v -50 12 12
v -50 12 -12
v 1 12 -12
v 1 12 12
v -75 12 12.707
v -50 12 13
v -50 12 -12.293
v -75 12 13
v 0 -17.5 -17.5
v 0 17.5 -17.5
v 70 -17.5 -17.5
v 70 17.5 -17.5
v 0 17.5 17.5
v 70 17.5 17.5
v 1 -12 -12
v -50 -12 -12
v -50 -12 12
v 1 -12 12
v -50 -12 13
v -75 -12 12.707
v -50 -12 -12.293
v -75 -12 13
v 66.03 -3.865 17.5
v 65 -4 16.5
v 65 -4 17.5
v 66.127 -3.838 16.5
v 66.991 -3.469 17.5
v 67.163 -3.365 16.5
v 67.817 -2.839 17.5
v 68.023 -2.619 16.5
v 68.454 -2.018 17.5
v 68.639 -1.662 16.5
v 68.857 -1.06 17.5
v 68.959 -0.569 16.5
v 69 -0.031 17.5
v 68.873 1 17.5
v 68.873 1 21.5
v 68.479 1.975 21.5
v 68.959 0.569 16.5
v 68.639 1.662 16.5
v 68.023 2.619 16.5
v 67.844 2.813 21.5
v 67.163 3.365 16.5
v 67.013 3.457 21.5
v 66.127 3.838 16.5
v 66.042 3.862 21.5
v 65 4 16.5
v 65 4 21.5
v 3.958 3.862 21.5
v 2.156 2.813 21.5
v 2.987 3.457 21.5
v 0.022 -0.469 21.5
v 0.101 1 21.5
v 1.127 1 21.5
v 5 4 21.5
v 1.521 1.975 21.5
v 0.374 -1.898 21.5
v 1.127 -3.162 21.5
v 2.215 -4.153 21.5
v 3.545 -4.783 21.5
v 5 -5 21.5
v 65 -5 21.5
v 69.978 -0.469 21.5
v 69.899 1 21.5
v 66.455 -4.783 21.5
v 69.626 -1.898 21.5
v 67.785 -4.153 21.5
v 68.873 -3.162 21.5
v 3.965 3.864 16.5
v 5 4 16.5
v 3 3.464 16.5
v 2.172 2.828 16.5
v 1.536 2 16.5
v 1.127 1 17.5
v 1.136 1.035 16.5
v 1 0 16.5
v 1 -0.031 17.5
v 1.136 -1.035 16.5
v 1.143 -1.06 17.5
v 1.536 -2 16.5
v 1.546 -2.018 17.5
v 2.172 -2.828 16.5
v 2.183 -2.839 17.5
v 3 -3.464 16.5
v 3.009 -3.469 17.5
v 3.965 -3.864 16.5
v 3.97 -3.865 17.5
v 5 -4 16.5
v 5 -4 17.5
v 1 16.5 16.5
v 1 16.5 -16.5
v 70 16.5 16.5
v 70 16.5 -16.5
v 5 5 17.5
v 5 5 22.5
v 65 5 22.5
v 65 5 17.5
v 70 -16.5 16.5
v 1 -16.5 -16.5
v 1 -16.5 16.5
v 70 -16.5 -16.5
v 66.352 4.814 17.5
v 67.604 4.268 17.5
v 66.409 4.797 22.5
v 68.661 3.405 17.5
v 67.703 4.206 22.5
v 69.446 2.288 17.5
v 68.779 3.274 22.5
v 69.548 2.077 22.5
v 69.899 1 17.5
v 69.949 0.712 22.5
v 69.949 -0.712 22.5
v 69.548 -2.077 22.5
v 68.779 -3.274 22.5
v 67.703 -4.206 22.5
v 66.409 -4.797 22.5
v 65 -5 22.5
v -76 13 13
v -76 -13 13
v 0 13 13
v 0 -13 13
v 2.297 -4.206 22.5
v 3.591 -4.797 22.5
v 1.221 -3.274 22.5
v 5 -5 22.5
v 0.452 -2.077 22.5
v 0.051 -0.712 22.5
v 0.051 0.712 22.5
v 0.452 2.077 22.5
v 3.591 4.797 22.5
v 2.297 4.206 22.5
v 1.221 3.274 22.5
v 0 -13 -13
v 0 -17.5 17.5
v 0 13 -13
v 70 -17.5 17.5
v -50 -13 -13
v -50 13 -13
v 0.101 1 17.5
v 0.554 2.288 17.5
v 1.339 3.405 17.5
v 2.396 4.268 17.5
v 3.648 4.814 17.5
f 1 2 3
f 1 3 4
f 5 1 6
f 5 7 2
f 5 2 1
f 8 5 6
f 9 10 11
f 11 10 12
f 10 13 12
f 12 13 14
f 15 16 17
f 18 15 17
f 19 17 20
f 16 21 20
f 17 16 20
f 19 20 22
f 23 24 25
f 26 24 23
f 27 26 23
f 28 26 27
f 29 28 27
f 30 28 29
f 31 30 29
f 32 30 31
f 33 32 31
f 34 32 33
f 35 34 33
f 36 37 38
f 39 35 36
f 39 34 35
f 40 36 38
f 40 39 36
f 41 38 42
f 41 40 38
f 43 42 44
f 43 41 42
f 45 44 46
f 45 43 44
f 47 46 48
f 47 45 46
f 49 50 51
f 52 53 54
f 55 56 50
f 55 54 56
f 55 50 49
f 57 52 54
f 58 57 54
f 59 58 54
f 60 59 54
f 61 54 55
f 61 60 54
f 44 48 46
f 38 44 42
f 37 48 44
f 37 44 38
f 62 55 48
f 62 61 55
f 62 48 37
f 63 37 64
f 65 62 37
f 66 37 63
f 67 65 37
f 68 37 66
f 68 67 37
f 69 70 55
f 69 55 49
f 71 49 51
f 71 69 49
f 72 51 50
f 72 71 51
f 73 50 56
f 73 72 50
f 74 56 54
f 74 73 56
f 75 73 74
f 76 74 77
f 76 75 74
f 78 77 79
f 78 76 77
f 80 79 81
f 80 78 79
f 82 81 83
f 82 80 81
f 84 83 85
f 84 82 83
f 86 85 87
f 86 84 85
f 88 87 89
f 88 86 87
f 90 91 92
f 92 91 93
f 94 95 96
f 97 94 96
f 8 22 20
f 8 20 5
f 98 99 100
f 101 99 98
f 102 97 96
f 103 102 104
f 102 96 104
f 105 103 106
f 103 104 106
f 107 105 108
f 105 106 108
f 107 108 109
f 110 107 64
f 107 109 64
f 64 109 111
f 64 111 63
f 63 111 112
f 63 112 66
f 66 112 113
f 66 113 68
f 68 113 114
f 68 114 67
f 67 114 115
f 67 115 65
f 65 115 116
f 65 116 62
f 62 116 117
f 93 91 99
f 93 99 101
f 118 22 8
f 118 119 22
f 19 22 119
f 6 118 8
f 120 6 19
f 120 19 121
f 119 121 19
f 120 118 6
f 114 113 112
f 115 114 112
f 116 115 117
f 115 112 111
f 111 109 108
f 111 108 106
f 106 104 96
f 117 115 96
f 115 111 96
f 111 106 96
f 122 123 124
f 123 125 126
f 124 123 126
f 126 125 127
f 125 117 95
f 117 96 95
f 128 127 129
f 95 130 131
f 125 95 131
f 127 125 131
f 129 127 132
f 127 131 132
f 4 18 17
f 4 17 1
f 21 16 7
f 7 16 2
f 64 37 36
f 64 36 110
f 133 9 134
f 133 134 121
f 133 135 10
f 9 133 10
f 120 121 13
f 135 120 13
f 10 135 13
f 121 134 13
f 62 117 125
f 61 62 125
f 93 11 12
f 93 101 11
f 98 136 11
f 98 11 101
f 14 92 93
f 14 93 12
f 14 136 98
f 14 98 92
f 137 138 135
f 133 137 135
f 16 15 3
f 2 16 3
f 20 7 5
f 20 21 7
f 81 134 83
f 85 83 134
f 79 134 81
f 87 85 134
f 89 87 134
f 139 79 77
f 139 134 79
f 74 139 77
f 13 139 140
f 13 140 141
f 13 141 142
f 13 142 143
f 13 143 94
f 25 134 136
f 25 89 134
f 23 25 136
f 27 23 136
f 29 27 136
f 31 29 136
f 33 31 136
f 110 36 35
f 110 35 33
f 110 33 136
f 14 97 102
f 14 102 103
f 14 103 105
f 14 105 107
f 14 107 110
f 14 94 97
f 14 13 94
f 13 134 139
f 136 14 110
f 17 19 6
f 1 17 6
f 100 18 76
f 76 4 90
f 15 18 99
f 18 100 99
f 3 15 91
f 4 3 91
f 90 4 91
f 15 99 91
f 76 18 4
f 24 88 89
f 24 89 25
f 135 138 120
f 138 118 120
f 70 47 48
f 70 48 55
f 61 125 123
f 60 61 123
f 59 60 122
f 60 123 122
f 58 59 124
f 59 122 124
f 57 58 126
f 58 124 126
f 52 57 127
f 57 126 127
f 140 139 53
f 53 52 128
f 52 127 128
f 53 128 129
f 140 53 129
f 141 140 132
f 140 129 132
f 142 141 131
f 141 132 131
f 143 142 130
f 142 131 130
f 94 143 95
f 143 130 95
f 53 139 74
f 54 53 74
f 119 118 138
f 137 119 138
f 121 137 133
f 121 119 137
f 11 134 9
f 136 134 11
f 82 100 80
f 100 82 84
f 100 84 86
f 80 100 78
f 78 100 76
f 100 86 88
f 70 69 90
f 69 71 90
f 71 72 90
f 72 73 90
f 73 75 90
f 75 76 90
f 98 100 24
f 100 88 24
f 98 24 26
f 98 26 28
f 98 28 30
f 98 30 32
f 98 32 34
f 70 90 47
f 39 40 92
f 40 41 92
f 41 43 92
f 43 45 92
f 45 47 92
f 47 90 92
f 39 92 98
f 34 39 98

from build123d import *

# Parameters (mm, degrees)
SKETCH_4_W           = 70
SKETCH_4_H           = 35
EXTRUDE_6_DEPTH      = 17.5
EXTRUDE_7_DEPTH      = 5
SHELL_START          = -16.5
SHELL_3_OUTLINE_W    = 69
SHELL_3_OUTLINE_H    = 33
SHELL_3_DEPTH        = 33
SHELL_START_2        = 16.5
SHELL_3_2_DEPTH      = 5
SKETCH_9_W           = 70
SKETCH_9_H           = 4
CUT_EXTRUDE_1_DEPTH  = 6
SKETCH_22_W          = 50
SKETCH_22_H          = 26
EXTRUDE_8_DEPTH      = 13
SHELL_START_3        = -50
SHELL_4_OUTLINE_W    = 24
SHELL_4_OUTLINE_H    = 24
SHELL_4_DEPTH        = 50
SKETCH_23_W          = 24
SKETCH_23_H          = 24
CUT_EXTRUDE_3_DEPTH  = 1
EXTRUDE_11_DEPTH     = 13
SHELL_START_4        = -12
SHELL_13_DEPTH       = 24
CUT_EXTRUDE_16_REACH = 85.741
SKETCH_40_W          = 25
SKETCH_40_H          = 24


# Read off the part's stored shape, not the designer's step: 抽壳3, 抽壳4, 抽壳13
with BuildPart() as part:
    # 草图4 → 凸台-拉伸6 (new, symmetric)
    with BuildSketch(Plane.XY):
        with Locations((35, 0)):
            Rectangle(SKETCH_4_W, SKETCH_4_H)
    extrude(amount=EXTRUDE_6_DEPTH, both=True)

    # 草图6 → 凸台-拉伸7 (add)
    with BuildSketch(Plane.XY.offset(22.5)):
        with BuildLine():
            Line((5, 5), (65, 5))
            ThreePointArc((65, 5), (70, 0), (65, -5))
            Line((65, -5), (5, -5))
            ThreePointArc((5, -5), (0, 0), (5, 5))
        make_face()
    extrude(amount=-EXTRUDE_7_DEPTH)

    # 抽壳3 outline → 抽壳3 (cut)
    with BuildSketch(Plane.XY.offset(SHELL_START)):
        with Locations((35.5, 0)):
            Rectangle(SHELL_3_OUTLINE_W, SHELL_3_OUTLINE_H)
    extrude(amount=SHELL_3_DEPTH, mode=Mode.SUBTRACT)

    # Shell 3 2 outline → Shell 3 2 (cut)
    with BuildSketch(Plane.XY.offset(SHELL_START_2)):
        with BuildLine():
            ThreePointArc((5, 4), (1, 0), (5, -4))
            Line((5, -4), (65, -4))
            ThreePointArc((65, -4), (69, 0), (65, 4))
            Line((65, 4), (5, 4))
        make_face()
    extrude(amount=SHELL_3_2_DEPTH, mode=Mode.SUBTRACT)

    # 草图9 → 切除-拉伸1 (cut)
    with BuildSketch(Plane.XZ.offset(5)):
        with Locations((35, 19.5)):
            Rectangle(SKETCH_9_W, SKETCH_9_H)
    extrude(amount=-CUT_EXTRUDE_1_DEPTH, mode=Mode.SUBTRACT)

    # 草图22 → 凸台-拉伸8 (add, symmetric)
    with BuildSketch(Plane.XY):
        with Locations((-25, 0)):
            Rectangle(SKETCH_22_W, SKETCH_22_H)
    extrude(amount=EXTRUDE_8_DEPTH, both=True)

    # 抽壳4 outline → 抽壳4 (cut)
    with BuildSketch(Plane.YZ.offset(SHELL_START_3)):
        Rectangle(SHELL_4_OUTLINE_W, SHELL_4_OUTLINE_H)
    extrude(amount=SHELL_4_DEPTH, mode=Mode.SUBTRACT)

    # 草图23 → 切除-拉伸3 (cut)
    with BuildSketch(Plane.ZY):
        Rectangle(SKETCH_23_W, SKETCH_23_H)
    extrude(amount=-CUT_EXTRUDE_3_DEPTH, mode=Mode.SUBTRACT)

    # 草图28 → 凸台-拉伸11 (add, symmetric)
    with BuildSketch(Plane(origin=(0, 0, 0), x_dir=(1, 0, 0), z_dir=(0, 1, 0))):
        Polygon((-50, 13), (-50, -13), (-76, -13), align=None)
    extrude(amount=EXTRUDE_11_DEPTH, both=True)

    # 抽壳13 outline → 抽壳13 (cut)
    with BuildSketch(Plane(origin=(0, 0, 0), x_dir=(1, 0, 0), z_dir=(0, 1, 0)).offset(SHELL_START_4)):
        Polygon((-50, 11.585786438), (-73.585786438, -12), (-50, -12), align=None)
    extrude(amount=SHELL_13_DEPTH, mode=Mode.SUBTRACT)

    # 切除-拉伸16: up to this plane
    cut_extrude_16_end = Plane(origin=(-75.646446609, 13, 13.353553391), z_dir=(0.7071067811865512, 0, 0.7071067811865439))
    # 草图40 → 切除-拉伸16 (cut, up to the surface)
    with BuildSketch(Plane.XY.offset(13), mode=Mode.PRIVATE) as cut_extrude_16_sk1:
        with Locations((-62.5, 0)):
            Rectangle(SKETCH_40_W, SKETCH_40_H)
    cut_extrude_16_tool1 = split(extrude(cut_extrude_16_sk1.sketch, amount=-CUT_EXTRUDE_16_REACH, mode=Mode.PRIVATE), bisect_by=cut_extrude_16_end, keep=Keep.BOTH, mode=Mode.PRIVATE)
    add(cut_extrude_16_tool1.solids().sort_by_distance((-62.5, 0, 13))[0], mode=Mode.SUBTRACT)


solid = part.part
